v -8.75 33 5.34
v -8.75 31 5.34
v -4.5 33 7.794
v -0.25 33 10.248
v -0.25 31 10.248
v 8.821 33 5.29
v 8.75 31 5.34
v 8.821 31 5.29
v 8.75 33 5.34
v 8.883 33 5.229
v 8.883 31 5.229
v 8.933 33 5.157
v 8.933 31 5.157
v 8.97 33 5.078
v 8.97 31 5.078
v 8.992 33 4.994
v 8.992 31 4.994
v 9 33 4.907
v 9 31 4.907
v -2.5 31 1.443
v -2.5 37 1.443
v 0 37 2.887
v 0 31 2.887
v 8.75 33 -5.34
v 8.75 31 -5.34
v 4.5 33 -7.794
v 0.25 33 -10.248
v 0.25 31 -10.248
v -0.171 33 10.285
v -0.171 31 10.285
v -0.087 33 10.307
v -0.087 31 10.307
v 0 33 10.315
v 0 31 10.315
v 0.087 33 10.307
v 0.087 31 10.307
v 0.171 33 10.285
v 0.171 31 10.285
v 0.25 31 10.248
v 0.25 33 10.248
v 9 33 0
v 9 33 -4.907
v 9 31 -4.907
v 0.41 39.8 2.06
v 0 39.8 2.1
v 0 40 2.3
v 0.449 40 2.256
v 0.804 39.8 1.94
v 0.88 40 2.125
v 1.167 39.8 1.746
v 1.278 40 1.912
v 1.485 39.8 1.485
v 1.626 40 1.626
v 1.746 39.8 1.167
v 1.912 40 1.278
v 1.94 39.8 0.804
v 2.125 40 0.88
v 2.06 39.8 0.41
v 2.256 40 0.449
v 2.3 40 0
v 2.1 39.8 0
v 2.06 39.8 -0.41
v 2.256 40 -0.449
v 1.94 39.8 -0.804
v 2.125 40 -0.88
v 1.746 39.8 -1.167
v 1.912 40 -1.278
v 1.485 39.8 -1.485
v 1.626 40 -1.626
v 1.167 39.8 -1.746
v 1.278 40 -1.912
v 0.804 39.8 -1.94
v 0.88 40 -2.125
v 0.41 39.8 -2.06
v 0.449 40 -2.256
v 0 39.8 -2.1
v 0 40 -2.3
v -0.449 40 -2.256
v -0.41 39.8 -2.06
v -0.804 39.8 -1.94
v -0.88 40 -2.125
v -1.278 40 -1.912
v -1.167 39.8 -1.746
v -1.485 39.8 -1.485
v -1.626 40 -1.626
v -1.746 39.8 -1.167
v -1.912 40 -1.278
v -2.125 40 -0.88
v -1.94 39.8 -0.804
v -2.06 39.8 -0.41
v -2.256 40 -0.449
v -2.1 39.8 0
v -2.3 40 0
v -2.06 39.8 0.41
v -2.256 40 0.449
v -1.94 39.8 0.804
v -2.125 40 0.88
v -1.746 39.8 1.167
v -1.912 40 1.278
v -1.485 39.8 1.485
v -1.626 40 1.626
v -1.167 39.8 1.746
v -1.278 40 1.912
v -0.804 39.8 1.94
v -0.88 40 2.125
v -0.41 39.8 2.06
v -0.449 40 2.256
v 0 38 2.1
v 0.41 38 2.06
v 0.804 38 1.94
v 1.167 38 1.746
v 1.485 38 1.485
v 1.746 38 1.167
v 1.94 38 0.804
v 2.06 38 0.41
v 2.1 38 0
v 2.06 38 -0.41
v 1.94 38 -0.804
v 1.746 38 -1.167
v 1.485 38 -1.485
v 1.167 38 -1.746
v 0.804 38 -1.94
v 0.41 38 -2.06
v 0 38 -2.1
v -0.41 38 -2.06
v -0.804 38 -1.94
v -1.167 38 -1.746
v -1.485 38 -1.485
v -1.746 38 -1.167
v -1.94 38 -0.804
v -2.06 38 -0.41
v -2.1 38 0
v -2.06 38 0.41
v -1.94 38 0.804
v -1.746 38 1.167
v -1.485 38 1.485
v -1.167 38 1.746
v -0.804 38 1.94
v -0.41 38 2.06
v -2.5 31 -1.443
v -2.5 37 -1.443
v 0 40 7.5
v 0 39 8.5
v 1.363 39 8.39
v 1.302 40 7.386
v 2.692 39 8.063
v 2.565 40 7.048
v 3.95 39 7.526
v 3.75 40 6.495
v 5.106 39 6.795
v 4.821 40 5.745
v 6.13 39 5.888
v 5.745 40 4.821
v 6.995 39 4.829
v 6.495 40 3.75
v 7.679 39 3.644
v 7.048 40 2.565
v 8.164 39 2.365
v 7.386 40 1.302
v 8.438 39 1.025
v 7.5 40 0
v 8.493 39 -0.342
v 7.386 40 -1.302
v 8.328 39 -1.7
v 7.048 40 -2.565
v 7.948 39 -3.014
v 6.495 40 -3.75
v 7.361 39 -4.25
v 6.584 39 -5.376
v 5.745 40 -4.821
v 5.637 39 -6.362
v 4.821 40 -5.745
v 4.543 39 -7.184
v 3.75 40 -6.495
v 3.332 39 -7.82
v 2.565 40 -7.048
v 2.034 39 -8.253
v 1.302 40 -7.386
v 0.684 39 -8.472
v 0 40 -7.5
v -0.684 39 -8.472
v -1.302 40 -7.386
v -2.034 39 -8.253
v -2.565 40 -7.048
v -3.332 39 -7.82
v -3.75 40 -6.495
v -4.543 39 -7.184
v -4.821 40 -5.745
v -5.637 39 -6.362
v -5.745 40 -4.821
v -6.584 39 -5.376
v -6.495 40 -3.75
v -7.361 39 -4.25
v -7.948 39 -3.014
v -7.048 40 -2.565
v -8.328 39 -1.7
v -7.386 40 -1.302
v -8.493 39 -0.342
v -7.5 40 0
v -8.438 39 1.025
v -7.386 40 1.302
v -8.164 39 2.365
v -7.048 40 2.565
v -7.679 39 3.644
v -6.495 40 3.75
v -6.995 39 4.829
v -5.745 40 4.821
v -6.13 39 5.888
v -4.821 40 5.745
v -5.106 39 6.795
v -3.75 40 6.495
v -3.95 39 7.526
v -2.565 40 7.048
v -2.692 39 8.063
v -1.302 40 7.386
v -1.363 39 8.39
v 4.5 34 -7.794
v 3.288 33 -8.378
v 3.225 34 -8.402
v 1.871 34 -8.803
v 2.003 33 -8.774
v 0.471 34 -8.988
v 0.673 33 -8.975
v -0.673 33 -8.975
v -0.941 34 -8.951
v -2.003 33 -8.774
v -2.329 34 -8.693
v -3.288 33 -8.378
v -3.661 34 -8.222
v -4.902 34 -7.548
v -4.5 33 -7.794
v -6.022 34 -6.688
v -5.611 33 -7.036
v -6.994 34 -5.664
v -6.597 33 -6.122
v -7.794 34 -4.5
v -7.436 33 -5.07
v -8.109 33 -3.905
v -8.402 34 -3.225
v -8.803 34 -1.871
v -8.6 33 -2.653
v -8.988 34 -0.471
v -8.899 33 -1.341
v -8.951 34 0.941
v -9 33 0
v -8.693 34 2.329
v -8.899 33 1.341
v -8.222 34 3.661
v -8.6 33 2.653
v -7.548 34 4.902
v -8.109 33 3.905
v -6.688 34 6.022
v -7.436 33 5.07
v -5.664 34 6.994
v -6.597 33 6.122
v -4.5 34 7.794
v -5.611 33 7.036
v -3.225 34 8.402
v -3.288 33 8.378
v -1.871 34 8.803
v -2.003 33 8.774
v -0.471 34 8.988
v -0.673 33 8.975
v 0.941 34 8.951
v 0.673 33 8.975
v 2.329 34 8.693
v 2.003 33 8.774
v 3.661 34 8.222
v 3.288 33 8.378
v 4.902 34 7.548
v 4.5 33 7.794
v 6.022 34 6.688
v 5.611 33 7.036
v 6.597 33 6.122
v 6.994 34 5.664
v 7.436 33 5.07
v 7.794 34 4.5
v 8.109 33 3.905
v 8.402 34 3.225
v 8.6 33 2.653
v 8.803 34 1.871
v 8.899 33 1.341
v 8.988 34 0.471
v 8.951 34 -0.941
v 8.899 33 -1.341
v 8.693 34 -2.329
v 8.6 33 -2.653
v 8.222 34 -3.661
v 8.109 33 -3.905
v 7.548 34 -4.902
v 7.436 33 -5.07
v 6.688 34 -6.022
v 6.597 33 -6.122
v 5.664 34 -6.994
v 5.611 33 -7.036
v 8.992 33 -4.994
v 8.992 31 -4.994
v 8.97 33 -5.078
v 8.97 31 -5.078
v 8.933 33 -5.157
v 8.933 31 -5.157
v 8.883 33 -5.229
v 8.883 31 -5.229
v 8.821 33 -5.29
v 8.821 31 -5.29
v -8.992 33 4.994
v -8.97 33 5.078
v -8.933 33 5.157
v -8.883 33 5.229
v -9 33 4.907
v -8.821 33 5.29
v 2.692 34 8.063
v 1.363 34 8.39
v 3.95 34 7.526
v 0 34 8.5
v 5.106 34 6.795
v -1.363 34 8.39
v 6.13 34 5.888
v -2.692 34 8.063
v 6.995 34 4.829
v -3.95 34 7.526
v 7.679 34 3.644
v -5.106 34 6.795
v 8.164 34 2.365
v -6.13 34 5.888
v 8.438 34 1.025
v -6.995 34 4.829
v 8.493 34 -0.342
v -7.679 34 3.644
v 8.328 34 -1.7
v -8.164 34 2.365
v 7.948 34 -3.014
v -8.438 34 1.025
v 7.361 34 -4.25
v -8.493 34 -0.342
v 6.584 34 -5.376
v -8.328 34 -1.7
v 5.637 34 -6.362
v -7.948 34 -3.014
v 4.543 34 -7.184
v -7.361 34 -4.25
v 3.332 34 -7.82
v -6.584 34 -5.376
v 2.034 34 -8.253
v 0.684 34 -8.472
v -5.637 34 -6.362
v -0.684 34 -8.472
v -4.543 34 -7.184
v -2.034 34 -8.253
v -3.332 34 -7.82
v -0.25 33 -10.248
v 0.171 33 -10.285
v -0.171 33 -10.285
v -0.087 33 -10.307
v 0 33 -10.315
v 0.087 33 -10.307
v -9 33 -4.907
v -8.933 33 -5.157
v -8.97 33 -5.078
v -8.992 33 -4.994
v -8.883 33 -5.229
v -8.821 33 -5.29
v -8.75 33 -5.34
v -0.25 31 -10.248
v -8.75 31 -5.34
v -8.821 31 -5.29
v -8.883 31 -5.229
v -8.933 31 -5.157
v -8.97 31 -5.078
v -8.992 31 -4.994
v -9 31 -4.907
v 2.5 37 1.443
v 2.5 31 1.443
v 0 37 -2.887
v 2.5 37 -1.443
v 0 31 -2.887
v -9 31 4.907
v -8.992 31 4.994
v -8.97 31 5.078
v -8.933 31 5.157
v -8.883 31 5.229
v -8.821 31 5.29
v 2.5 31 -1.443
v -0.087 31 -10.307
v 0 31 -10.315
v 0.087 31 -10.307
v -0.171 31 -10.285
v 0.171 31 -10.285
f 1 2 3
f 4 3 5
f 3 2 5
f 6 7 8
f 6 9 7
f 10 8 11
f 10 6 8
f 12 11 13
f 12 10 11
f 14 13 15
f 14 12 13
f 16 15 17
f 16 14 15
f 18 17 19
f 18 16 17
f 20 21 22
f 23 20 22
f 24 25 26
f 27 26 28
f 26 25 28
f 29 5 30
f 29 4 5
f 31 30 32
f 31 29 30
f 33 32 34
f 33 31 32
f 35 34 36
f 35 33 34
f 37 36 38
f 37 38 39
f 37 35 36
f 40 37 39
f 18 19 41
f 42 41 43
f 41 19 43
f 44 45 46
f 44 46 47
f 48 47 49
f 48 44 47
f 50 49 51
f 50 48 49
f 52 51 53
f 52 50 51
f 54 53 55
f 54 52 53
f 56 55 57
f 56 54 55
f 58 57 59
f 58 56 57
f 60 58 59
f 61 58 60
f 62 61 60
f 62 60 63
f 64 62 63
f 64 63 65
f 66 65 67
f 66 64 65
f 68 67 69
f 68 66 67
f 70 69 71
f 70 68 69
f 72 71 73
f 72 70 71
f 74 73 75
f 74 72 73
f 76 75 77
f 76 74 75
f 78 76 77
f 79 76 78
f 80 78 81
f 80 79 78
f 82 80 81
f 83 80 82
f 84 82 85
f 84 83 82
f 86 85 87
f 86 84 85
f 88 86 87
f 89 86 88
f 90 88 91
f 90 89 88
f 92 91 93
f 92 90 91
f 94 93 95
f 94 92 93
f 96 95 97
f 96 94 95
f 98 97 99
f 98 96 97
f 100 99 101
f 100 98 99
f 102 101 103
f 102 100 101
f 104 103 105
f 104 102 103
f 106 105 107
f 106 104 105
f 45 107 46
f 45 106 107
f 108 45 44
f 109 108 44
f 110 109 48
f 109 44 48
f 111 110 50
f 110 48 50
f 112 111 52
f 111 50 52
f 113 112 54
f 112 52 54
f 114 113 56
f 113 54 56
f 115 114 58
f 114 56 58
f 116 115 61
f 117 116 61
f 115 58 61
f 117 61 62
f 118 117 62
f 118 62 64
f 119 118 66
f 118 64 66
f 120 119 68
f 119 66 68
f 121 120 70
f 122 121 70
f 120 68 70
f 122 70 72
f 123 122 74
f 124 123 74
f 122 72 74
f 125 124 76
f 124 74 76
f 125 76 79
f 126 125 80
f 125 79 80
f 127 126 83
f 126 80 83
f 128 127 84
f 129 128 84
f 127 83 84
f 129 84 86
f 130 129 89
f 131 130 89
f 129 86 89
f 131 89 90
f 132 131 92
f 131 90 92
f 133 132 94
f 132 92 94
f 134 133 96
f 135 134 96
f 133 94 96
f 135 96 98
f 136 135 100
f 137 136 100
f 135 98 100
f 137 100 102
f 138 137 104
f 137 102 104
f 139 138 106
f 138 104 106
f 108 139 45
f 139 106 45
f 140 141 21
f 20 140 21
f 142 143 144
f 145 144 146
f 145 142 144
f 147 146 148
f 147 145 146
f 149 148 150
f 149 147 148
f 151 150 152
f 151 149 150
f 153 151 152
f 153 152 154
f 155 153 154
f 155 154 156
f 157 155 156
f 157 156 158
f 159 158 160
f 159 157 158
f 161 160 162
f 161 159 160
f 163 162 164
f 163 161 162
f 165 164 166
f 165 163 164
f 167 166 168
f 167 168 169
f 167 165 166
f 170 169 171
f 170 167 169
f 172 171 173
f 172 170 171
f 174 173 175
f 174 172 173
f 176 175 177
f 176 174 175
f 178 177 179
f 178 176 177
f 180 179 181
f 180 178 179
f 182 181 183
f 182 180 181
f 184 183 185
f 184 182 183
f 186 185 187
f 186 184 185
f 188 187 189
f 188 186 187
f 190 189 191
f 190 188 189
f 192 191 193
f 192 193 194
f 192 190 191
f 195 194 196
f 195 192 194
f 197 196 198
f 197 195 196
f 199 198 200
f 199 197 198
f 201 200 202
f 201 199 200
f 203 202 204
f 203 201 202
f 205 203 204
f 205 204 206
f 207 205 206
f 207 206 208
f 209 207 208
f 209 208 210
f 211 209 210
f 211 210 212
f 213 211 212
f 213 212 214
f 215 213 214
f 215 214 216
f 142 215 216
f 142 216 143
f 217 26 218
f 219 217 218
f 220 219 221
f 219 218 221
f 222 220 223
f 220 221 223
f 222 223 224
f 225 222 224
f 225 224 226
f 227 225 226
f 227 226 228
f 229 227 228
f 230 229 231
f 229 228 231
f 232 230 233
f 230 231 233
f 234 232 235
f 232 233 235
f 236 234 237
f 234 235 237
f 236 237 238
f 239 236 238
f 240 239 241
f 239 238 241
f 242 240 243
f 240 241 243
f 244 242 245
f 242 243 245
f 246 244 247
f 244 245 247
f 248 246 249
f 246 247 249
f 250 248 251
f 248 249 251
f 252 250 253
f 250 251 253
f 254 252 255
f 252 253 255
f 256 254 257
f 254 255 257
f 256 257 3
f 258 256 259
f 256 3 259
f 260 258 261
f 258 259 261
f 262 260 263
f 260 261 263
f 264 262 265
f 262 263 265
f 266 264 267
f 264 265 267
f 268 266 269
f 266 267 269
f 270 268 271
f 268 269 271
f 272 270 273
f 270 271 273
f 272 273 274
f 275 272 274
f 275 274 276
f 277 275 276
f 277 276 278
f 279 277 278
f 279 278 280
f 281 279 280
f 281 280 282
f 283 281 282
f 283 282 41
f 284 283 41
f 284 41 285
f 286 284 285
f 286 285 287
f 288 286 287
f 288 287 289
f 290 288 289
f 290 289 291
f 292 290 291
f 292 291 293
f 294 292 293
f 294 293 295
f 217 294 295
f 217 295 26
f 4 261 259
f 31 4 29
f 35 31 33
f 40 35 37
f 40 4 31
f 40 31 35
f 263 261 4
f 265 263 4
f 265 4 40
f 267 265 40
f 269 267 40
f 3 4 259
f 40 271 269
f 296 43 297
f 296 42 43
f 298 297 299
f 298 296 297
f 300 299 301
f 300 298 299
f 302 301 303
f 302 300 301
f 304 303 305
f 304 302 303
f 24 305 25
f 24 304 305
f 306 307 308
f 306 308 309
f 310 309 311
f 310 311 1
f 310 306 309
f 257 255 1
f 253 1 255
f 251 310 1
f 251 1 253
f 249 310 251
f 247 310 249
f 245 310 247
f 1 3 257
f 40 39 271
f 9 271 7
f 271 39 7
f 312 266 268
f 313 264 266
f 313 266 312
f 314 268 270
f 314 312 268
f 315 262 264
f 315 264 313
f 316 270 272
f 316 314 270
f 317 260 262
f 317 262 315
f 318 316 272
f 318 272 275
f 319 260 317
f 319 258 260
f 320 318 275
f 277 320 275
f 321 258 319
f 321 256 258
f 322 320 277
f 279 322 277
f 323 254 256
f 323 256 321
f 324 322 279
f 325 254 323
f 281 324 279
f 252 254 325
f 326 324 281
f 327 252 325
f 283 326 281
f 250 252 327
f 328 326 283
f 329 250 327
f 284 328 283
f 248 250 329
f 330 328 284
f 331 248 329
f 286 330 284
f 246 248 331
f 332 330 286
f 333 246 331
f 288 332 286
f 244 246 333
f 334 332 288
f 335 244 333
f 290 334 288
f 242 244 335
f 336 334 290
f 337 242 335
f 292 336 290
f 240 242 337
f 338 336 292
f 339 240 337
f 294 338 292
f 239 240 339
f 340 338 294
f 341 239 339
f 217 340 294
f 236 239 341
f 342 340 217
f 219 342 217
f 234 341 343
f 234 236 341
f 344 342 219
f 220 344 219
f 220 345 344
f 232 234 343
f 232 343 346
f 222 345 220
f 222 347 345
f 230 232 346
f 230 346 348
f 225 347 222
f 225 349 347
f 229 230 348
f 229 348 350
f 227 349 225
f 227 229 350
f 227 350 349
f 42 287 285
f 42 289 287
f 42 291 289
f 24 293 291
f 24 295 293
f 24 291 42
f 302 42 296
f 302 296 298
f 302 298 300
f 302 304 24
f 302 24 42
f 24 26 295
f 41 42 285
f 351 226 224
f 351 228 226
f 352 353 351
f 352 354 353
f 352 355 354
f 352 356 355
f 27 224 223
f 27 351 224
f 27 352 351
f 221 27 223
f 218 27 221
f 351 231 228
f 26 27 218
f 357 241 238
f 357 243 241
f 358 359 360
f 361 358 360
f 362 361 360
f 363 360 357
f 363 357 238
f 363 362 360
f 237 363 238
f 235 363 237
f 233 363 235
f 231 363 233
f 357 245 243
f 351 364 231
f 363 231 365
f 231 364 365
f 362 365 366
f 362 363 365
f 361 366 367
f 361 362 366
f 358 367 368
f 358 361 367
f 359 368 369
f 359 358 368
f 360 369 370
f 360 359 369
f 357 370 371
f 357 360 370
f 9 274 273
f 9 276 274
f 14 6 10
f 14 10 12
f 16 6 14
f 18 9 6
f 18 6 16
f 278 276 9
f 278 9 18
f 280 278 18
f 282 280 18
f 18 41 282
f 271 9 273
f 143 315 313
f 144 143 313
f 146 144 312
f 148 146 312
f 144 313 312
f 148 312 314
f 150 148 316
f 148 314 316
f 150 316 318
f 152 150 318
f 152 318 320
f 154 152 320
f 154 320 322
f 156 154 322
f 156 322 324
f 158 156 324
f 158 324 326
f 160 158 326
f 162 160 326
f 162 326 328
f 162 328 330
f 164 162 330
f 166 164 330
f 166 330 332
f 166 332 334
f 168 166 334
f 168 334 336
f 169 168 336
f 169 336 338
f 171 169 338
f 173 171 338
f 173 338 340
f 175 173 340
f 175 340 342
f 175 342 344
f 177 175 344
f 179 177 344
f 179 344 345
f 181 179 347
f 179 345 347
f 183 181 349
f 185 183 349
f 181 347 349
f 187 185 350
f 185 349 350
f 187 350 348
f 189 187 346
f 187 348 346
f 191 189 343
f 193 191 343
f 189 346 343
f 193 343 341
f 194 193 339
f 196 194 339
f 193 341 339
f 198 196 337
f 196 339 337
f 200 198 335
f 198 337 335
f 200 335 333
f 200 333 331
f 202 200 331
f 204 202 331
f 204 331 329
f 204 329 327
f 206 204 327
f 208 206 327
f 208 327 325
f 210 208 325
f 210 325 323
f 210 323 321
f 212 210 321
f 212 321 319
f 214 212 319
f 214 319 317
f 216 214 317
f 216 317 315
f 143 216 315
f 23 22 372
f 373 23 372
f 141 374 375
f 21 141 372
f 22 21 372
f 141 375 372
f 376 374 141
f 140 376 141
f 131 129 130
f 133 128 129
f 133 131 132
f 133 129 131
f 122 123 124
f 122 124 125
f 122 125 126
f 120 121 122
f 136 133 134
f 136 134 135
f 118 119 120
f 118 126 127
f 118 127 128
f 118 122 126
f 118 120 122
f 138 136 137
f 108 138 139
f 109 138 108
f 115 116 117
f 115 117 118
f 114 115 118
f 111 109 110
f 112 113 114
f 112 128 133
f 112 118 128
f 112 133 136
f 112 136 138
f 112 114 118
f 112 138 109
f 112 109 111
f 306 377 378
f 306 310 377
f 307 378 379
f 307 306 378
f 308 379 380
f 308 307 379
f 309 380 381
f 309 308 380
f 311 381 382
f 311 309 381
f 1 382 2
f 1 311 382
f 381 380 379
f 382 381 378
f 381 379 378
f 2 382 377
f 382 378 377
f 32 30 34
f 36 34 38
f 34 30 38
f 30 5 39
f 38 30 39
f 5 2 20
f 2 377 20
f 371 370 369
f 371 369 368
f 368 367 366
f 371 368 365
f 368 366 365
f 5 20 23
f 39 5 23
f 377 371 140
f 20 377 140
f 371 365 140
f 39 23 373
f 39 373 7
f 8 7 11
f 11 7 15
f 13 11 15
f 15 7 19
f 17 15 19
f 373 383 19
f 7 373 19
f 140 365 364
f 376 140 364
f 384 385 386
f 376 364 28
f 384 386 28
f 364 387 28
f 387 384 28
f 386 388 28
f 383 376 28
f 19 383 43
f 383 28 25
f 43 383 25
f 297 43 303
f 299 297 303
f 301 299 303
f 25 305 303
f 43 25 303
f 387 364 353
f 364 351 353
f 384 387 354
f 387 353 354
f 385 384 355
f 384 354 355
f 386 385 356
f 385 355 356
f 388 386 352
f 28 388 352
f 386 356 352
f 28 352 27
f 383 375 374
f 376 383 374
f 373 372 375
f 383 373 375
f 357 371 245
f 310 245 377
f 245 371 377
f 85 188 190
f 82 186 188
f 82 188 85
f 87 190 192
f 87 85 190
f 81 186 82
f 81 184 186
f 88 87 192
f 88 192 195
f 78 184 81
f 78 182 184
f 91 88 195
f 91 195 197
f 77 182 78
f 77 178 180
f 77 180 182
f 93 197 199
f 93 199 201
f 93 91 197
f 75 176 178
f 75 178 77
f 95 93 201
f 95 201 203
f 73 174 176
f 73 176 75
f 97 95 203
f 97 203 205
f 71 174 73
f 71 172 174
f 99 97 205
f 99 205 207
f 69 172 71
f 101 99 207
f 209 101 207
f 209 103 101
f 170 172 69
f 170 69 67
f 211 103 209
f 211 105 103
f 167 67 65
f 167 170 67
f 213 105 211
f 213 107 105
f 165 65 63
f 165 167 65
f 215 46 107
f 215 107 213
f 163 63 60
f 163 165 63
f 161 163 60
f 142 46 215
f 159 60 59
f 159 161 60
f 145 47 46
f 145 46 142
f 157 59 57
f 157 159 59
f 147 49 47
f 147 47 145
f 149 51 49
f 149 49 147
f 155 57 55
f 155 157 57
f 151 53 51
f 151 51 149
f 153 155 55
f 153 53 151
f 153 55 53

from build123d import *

# Parameters (mm, degrees)
BOSS_EXTRUDE1_DEPTH      = 2
FILLET1_R                = 0.5
SKETCH2_R                = 9
BOSS_EXTRUDE2_DEPTH      = 1
SKETCH3_R                = 8.5
BOSS_EXTRUDE3_DEPTH      = 4
CUT_EXTRUDE1_DEPTH       = 16.375249198
BOSS_EXTRUDE4_DEPTH      = 1
BOSS_EXTRUDE4_DEPTH_BACK = 1
SKETCH5_R                = 8.5
SKETCH6_R                = 8.5
BOSS_EXTRUDE5_DEPTH      = 1
CHAMFER2_SIZE            = 1
SKETCH7_R                = 2.1
CUT_EXTRUDE2_DEPTH       = 2
CHAMFER3_SIZE            = 0.2


with BuildPart() as part:
    # Sketch1 → Boss-Extrude1 (new body)
    with BuildSketch(Plane(origin=(0, 31, 0), x_dir=(1, 0, 0), z_dir=(0, 1, 0))):
        Polygon((0, 10.392304845), (-9, 5.196152423), (-9, -5.196152423), (0, -10.392304845), (9, -5.196152423), (9, 5.196152423), align=None)
    extrude(amount=BOSS_EXTRUDE1_DEPTH)

    # Fillet1
    fillet1_edges = [part.edges().sort_by_distance(p)[0] for p in [
        (9, 32, -5.196152423),
        (9, 32, 5.196152423),
        (0, 32, 10.392304845),
        (-9, 32, 5.196152423),
        (-9, 32, -5.196152423),
        (0, 32, -10.392304845),
    ]]
    fillet(fillet1_edges, radius=FILLET1_R)

    # Sketch2 → Boss-Extrude2 (add)
    with BuildSketch(Plane(origin=(0, 33, 0), x_dir=(1, 0, 0), z_dir=(0, 1, 0))):
        with Locations(Location((0, 0, 0), (0, 0, 60))):
            Circle(SKETCH2_R)
    extrude(amount=BOSS_EXTRUDE2_DEPTH)

    # Sketch3 → Boss-Extrude3 (add)
    with BuildSketch(Plane(origin=(0, 34, 0), x_dir=(1, 0, 0), z_dir=(0, 1, 0))):
        with Locations(Location((0, 0, 0), (0, 0, 270))):
            Circle(SKETCH3_R)
    extrude(amount=BOSS_EXTRUDE3_DEPTH)

    # Sketch4 → Cut-Extrude1 (cut, through all)
    with BuildSketch(Plane(origin=(0, 38, 0), x_dir=(1, 0, 0), z_dir=(0, 1, 0))):
        Polygon((0, 2.886751346), (-2.5, 1.443375673), (-2.5, -1.443375673), (0, -2.886751346), (2.5, -1.443375673), (2.5, 1.443375673), align=None)
    extrude(amount=-CUT_EXTRUDE1_DEPTH, mode=Mode.SUBTRACT)

    # Sketch5 → Boss-Extrude4 (add, two sides: drawn at the far end of the back side and taken through both)
    with BuildSketch(Plane(origin=(0, 38, 0), x_dir=(1, 0, 0), z_dir=(0, 1, 0)).offset(-BOSS_EXTRUDE4_DEPTH_BACK)):
        with Locations(Location((0, 0, 0), (0, 0, 270))):
            Circle(SKETCH5_R)
    extrude(amount=BOSS_EXTRUDE4_DEPTH + BOSS_EXTRUDE4_DEPTH_BACK)

    # Sketch6 → Boss-Extrude5 (add)
    with BuildSketch(Plane(origin=(0, 39, 0), x_dir=(1, 0, 0), z_dir=(0, 1, 0))):
        with Locations(Location((0, 0, 0), (0, 0, 270))):
            Circle(SKETCH6_R)
    extrude(amount=BOSS_EXTRUDE5_DEPTH)

    # Chamfer2
    chamfer2_edges = [part.edges().sort_by_distance(p)[0] for p in [
        (0, 40, -8.5),
    ]]
    chamfer(chamfer2_edges, length=CHAMFER2_SIZE)

    # Sketch7 → Cut-Extrude2 (cut)
    with BuildSketch(Plane(origin=(0, 40, 0), x_dir=(1, 0, 0), z_dir=(0, 1, 0))):
        with Locations(Location((0, 0, 0), (0, 0, 270))):
            Circle(SKETCH7_R)
    extrude(amount=-CUT_EXTRUDE2_DEPTH, mode=Mode.SUBTRACT)

    # Chamfer3
    chamfer3_edges = [part.edges().sort_by_distance(p)[0] for p in [
        (0, 40, -2.1),
    ]]
    chamfer(chamfer3_edges, length=CHAMFER3_SIZE)


solid = part.part
